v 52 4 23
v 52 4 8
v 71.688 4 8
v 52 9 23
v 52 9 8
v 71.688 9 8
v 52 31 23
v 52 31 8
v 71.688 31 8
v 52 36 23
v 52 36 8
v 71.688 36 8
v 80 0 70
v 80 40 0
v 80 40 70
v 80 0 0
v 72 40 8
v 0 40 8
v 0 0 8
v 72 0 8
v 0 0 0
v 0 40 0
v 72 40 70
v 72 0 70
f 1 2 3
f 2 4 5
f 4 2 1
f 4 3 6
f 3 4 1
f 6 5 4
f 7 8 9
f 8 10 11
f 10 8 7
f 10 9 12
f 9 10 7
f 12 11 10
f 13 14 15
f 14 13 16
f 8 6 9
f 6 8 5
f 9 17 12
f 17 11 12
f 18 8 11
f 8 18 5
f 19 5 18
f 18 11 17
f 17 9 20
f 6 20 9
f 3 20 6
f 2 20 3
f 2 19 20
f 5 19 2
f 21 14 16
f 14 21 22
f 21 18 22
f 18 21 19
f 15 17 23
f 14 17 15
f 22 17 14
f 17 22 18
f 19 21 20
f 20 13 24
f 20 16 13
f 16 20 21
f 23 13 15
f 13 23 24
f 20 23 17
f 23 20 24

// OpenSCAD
$fn = 32;

// ----------------------------------------------------------------------
// Rib bracket: 2-gusset L bracket
// ----------------------------------------------------------------------

// --- parameters (mm) ---
base_l = 80;              // foot length, X
base_w = 40;              // foot width, Y
base_t = 8;               // foot thickness
plate_t = 8;              // upright plate thickness
plate_h = 70;             // overall height
gus_l = 20;               // gusset leg along the foot
gus_h = 16;               // gusset height
gus_t = 5;                // gusset thickness
gus_edge = 4;             // gusset margin from the foot edge
n_gus = 2;                // gusset count
fit_tol = 0.02;           // tolerance for press fits, mm
free_tol = 0.2;           // tolerance for clearance fits, mm

gus_pitch = (base_w - 2 * gus_edge - gus_t) / (n_gus - 1);  // gusset pitch

union() {
  cube([base_l, base_w, base_t]);
  translate([base_l - plate_t, 0, base_t - 1])
    cube([plate_t, base_w, plate_h - base_t + 1]);
  for (i = [0 : n_gus - 1])
    translate([base_l - plate_t - gus_l, gus_edge + i * gus_pitch, base_t - 1])
      rotate([-90, 0, 0])
        linear_extrude(height = gus_t)
          polygon(points = [[0, 0], [gus_l + 1, 0], [0, -gus_h]]);
}
